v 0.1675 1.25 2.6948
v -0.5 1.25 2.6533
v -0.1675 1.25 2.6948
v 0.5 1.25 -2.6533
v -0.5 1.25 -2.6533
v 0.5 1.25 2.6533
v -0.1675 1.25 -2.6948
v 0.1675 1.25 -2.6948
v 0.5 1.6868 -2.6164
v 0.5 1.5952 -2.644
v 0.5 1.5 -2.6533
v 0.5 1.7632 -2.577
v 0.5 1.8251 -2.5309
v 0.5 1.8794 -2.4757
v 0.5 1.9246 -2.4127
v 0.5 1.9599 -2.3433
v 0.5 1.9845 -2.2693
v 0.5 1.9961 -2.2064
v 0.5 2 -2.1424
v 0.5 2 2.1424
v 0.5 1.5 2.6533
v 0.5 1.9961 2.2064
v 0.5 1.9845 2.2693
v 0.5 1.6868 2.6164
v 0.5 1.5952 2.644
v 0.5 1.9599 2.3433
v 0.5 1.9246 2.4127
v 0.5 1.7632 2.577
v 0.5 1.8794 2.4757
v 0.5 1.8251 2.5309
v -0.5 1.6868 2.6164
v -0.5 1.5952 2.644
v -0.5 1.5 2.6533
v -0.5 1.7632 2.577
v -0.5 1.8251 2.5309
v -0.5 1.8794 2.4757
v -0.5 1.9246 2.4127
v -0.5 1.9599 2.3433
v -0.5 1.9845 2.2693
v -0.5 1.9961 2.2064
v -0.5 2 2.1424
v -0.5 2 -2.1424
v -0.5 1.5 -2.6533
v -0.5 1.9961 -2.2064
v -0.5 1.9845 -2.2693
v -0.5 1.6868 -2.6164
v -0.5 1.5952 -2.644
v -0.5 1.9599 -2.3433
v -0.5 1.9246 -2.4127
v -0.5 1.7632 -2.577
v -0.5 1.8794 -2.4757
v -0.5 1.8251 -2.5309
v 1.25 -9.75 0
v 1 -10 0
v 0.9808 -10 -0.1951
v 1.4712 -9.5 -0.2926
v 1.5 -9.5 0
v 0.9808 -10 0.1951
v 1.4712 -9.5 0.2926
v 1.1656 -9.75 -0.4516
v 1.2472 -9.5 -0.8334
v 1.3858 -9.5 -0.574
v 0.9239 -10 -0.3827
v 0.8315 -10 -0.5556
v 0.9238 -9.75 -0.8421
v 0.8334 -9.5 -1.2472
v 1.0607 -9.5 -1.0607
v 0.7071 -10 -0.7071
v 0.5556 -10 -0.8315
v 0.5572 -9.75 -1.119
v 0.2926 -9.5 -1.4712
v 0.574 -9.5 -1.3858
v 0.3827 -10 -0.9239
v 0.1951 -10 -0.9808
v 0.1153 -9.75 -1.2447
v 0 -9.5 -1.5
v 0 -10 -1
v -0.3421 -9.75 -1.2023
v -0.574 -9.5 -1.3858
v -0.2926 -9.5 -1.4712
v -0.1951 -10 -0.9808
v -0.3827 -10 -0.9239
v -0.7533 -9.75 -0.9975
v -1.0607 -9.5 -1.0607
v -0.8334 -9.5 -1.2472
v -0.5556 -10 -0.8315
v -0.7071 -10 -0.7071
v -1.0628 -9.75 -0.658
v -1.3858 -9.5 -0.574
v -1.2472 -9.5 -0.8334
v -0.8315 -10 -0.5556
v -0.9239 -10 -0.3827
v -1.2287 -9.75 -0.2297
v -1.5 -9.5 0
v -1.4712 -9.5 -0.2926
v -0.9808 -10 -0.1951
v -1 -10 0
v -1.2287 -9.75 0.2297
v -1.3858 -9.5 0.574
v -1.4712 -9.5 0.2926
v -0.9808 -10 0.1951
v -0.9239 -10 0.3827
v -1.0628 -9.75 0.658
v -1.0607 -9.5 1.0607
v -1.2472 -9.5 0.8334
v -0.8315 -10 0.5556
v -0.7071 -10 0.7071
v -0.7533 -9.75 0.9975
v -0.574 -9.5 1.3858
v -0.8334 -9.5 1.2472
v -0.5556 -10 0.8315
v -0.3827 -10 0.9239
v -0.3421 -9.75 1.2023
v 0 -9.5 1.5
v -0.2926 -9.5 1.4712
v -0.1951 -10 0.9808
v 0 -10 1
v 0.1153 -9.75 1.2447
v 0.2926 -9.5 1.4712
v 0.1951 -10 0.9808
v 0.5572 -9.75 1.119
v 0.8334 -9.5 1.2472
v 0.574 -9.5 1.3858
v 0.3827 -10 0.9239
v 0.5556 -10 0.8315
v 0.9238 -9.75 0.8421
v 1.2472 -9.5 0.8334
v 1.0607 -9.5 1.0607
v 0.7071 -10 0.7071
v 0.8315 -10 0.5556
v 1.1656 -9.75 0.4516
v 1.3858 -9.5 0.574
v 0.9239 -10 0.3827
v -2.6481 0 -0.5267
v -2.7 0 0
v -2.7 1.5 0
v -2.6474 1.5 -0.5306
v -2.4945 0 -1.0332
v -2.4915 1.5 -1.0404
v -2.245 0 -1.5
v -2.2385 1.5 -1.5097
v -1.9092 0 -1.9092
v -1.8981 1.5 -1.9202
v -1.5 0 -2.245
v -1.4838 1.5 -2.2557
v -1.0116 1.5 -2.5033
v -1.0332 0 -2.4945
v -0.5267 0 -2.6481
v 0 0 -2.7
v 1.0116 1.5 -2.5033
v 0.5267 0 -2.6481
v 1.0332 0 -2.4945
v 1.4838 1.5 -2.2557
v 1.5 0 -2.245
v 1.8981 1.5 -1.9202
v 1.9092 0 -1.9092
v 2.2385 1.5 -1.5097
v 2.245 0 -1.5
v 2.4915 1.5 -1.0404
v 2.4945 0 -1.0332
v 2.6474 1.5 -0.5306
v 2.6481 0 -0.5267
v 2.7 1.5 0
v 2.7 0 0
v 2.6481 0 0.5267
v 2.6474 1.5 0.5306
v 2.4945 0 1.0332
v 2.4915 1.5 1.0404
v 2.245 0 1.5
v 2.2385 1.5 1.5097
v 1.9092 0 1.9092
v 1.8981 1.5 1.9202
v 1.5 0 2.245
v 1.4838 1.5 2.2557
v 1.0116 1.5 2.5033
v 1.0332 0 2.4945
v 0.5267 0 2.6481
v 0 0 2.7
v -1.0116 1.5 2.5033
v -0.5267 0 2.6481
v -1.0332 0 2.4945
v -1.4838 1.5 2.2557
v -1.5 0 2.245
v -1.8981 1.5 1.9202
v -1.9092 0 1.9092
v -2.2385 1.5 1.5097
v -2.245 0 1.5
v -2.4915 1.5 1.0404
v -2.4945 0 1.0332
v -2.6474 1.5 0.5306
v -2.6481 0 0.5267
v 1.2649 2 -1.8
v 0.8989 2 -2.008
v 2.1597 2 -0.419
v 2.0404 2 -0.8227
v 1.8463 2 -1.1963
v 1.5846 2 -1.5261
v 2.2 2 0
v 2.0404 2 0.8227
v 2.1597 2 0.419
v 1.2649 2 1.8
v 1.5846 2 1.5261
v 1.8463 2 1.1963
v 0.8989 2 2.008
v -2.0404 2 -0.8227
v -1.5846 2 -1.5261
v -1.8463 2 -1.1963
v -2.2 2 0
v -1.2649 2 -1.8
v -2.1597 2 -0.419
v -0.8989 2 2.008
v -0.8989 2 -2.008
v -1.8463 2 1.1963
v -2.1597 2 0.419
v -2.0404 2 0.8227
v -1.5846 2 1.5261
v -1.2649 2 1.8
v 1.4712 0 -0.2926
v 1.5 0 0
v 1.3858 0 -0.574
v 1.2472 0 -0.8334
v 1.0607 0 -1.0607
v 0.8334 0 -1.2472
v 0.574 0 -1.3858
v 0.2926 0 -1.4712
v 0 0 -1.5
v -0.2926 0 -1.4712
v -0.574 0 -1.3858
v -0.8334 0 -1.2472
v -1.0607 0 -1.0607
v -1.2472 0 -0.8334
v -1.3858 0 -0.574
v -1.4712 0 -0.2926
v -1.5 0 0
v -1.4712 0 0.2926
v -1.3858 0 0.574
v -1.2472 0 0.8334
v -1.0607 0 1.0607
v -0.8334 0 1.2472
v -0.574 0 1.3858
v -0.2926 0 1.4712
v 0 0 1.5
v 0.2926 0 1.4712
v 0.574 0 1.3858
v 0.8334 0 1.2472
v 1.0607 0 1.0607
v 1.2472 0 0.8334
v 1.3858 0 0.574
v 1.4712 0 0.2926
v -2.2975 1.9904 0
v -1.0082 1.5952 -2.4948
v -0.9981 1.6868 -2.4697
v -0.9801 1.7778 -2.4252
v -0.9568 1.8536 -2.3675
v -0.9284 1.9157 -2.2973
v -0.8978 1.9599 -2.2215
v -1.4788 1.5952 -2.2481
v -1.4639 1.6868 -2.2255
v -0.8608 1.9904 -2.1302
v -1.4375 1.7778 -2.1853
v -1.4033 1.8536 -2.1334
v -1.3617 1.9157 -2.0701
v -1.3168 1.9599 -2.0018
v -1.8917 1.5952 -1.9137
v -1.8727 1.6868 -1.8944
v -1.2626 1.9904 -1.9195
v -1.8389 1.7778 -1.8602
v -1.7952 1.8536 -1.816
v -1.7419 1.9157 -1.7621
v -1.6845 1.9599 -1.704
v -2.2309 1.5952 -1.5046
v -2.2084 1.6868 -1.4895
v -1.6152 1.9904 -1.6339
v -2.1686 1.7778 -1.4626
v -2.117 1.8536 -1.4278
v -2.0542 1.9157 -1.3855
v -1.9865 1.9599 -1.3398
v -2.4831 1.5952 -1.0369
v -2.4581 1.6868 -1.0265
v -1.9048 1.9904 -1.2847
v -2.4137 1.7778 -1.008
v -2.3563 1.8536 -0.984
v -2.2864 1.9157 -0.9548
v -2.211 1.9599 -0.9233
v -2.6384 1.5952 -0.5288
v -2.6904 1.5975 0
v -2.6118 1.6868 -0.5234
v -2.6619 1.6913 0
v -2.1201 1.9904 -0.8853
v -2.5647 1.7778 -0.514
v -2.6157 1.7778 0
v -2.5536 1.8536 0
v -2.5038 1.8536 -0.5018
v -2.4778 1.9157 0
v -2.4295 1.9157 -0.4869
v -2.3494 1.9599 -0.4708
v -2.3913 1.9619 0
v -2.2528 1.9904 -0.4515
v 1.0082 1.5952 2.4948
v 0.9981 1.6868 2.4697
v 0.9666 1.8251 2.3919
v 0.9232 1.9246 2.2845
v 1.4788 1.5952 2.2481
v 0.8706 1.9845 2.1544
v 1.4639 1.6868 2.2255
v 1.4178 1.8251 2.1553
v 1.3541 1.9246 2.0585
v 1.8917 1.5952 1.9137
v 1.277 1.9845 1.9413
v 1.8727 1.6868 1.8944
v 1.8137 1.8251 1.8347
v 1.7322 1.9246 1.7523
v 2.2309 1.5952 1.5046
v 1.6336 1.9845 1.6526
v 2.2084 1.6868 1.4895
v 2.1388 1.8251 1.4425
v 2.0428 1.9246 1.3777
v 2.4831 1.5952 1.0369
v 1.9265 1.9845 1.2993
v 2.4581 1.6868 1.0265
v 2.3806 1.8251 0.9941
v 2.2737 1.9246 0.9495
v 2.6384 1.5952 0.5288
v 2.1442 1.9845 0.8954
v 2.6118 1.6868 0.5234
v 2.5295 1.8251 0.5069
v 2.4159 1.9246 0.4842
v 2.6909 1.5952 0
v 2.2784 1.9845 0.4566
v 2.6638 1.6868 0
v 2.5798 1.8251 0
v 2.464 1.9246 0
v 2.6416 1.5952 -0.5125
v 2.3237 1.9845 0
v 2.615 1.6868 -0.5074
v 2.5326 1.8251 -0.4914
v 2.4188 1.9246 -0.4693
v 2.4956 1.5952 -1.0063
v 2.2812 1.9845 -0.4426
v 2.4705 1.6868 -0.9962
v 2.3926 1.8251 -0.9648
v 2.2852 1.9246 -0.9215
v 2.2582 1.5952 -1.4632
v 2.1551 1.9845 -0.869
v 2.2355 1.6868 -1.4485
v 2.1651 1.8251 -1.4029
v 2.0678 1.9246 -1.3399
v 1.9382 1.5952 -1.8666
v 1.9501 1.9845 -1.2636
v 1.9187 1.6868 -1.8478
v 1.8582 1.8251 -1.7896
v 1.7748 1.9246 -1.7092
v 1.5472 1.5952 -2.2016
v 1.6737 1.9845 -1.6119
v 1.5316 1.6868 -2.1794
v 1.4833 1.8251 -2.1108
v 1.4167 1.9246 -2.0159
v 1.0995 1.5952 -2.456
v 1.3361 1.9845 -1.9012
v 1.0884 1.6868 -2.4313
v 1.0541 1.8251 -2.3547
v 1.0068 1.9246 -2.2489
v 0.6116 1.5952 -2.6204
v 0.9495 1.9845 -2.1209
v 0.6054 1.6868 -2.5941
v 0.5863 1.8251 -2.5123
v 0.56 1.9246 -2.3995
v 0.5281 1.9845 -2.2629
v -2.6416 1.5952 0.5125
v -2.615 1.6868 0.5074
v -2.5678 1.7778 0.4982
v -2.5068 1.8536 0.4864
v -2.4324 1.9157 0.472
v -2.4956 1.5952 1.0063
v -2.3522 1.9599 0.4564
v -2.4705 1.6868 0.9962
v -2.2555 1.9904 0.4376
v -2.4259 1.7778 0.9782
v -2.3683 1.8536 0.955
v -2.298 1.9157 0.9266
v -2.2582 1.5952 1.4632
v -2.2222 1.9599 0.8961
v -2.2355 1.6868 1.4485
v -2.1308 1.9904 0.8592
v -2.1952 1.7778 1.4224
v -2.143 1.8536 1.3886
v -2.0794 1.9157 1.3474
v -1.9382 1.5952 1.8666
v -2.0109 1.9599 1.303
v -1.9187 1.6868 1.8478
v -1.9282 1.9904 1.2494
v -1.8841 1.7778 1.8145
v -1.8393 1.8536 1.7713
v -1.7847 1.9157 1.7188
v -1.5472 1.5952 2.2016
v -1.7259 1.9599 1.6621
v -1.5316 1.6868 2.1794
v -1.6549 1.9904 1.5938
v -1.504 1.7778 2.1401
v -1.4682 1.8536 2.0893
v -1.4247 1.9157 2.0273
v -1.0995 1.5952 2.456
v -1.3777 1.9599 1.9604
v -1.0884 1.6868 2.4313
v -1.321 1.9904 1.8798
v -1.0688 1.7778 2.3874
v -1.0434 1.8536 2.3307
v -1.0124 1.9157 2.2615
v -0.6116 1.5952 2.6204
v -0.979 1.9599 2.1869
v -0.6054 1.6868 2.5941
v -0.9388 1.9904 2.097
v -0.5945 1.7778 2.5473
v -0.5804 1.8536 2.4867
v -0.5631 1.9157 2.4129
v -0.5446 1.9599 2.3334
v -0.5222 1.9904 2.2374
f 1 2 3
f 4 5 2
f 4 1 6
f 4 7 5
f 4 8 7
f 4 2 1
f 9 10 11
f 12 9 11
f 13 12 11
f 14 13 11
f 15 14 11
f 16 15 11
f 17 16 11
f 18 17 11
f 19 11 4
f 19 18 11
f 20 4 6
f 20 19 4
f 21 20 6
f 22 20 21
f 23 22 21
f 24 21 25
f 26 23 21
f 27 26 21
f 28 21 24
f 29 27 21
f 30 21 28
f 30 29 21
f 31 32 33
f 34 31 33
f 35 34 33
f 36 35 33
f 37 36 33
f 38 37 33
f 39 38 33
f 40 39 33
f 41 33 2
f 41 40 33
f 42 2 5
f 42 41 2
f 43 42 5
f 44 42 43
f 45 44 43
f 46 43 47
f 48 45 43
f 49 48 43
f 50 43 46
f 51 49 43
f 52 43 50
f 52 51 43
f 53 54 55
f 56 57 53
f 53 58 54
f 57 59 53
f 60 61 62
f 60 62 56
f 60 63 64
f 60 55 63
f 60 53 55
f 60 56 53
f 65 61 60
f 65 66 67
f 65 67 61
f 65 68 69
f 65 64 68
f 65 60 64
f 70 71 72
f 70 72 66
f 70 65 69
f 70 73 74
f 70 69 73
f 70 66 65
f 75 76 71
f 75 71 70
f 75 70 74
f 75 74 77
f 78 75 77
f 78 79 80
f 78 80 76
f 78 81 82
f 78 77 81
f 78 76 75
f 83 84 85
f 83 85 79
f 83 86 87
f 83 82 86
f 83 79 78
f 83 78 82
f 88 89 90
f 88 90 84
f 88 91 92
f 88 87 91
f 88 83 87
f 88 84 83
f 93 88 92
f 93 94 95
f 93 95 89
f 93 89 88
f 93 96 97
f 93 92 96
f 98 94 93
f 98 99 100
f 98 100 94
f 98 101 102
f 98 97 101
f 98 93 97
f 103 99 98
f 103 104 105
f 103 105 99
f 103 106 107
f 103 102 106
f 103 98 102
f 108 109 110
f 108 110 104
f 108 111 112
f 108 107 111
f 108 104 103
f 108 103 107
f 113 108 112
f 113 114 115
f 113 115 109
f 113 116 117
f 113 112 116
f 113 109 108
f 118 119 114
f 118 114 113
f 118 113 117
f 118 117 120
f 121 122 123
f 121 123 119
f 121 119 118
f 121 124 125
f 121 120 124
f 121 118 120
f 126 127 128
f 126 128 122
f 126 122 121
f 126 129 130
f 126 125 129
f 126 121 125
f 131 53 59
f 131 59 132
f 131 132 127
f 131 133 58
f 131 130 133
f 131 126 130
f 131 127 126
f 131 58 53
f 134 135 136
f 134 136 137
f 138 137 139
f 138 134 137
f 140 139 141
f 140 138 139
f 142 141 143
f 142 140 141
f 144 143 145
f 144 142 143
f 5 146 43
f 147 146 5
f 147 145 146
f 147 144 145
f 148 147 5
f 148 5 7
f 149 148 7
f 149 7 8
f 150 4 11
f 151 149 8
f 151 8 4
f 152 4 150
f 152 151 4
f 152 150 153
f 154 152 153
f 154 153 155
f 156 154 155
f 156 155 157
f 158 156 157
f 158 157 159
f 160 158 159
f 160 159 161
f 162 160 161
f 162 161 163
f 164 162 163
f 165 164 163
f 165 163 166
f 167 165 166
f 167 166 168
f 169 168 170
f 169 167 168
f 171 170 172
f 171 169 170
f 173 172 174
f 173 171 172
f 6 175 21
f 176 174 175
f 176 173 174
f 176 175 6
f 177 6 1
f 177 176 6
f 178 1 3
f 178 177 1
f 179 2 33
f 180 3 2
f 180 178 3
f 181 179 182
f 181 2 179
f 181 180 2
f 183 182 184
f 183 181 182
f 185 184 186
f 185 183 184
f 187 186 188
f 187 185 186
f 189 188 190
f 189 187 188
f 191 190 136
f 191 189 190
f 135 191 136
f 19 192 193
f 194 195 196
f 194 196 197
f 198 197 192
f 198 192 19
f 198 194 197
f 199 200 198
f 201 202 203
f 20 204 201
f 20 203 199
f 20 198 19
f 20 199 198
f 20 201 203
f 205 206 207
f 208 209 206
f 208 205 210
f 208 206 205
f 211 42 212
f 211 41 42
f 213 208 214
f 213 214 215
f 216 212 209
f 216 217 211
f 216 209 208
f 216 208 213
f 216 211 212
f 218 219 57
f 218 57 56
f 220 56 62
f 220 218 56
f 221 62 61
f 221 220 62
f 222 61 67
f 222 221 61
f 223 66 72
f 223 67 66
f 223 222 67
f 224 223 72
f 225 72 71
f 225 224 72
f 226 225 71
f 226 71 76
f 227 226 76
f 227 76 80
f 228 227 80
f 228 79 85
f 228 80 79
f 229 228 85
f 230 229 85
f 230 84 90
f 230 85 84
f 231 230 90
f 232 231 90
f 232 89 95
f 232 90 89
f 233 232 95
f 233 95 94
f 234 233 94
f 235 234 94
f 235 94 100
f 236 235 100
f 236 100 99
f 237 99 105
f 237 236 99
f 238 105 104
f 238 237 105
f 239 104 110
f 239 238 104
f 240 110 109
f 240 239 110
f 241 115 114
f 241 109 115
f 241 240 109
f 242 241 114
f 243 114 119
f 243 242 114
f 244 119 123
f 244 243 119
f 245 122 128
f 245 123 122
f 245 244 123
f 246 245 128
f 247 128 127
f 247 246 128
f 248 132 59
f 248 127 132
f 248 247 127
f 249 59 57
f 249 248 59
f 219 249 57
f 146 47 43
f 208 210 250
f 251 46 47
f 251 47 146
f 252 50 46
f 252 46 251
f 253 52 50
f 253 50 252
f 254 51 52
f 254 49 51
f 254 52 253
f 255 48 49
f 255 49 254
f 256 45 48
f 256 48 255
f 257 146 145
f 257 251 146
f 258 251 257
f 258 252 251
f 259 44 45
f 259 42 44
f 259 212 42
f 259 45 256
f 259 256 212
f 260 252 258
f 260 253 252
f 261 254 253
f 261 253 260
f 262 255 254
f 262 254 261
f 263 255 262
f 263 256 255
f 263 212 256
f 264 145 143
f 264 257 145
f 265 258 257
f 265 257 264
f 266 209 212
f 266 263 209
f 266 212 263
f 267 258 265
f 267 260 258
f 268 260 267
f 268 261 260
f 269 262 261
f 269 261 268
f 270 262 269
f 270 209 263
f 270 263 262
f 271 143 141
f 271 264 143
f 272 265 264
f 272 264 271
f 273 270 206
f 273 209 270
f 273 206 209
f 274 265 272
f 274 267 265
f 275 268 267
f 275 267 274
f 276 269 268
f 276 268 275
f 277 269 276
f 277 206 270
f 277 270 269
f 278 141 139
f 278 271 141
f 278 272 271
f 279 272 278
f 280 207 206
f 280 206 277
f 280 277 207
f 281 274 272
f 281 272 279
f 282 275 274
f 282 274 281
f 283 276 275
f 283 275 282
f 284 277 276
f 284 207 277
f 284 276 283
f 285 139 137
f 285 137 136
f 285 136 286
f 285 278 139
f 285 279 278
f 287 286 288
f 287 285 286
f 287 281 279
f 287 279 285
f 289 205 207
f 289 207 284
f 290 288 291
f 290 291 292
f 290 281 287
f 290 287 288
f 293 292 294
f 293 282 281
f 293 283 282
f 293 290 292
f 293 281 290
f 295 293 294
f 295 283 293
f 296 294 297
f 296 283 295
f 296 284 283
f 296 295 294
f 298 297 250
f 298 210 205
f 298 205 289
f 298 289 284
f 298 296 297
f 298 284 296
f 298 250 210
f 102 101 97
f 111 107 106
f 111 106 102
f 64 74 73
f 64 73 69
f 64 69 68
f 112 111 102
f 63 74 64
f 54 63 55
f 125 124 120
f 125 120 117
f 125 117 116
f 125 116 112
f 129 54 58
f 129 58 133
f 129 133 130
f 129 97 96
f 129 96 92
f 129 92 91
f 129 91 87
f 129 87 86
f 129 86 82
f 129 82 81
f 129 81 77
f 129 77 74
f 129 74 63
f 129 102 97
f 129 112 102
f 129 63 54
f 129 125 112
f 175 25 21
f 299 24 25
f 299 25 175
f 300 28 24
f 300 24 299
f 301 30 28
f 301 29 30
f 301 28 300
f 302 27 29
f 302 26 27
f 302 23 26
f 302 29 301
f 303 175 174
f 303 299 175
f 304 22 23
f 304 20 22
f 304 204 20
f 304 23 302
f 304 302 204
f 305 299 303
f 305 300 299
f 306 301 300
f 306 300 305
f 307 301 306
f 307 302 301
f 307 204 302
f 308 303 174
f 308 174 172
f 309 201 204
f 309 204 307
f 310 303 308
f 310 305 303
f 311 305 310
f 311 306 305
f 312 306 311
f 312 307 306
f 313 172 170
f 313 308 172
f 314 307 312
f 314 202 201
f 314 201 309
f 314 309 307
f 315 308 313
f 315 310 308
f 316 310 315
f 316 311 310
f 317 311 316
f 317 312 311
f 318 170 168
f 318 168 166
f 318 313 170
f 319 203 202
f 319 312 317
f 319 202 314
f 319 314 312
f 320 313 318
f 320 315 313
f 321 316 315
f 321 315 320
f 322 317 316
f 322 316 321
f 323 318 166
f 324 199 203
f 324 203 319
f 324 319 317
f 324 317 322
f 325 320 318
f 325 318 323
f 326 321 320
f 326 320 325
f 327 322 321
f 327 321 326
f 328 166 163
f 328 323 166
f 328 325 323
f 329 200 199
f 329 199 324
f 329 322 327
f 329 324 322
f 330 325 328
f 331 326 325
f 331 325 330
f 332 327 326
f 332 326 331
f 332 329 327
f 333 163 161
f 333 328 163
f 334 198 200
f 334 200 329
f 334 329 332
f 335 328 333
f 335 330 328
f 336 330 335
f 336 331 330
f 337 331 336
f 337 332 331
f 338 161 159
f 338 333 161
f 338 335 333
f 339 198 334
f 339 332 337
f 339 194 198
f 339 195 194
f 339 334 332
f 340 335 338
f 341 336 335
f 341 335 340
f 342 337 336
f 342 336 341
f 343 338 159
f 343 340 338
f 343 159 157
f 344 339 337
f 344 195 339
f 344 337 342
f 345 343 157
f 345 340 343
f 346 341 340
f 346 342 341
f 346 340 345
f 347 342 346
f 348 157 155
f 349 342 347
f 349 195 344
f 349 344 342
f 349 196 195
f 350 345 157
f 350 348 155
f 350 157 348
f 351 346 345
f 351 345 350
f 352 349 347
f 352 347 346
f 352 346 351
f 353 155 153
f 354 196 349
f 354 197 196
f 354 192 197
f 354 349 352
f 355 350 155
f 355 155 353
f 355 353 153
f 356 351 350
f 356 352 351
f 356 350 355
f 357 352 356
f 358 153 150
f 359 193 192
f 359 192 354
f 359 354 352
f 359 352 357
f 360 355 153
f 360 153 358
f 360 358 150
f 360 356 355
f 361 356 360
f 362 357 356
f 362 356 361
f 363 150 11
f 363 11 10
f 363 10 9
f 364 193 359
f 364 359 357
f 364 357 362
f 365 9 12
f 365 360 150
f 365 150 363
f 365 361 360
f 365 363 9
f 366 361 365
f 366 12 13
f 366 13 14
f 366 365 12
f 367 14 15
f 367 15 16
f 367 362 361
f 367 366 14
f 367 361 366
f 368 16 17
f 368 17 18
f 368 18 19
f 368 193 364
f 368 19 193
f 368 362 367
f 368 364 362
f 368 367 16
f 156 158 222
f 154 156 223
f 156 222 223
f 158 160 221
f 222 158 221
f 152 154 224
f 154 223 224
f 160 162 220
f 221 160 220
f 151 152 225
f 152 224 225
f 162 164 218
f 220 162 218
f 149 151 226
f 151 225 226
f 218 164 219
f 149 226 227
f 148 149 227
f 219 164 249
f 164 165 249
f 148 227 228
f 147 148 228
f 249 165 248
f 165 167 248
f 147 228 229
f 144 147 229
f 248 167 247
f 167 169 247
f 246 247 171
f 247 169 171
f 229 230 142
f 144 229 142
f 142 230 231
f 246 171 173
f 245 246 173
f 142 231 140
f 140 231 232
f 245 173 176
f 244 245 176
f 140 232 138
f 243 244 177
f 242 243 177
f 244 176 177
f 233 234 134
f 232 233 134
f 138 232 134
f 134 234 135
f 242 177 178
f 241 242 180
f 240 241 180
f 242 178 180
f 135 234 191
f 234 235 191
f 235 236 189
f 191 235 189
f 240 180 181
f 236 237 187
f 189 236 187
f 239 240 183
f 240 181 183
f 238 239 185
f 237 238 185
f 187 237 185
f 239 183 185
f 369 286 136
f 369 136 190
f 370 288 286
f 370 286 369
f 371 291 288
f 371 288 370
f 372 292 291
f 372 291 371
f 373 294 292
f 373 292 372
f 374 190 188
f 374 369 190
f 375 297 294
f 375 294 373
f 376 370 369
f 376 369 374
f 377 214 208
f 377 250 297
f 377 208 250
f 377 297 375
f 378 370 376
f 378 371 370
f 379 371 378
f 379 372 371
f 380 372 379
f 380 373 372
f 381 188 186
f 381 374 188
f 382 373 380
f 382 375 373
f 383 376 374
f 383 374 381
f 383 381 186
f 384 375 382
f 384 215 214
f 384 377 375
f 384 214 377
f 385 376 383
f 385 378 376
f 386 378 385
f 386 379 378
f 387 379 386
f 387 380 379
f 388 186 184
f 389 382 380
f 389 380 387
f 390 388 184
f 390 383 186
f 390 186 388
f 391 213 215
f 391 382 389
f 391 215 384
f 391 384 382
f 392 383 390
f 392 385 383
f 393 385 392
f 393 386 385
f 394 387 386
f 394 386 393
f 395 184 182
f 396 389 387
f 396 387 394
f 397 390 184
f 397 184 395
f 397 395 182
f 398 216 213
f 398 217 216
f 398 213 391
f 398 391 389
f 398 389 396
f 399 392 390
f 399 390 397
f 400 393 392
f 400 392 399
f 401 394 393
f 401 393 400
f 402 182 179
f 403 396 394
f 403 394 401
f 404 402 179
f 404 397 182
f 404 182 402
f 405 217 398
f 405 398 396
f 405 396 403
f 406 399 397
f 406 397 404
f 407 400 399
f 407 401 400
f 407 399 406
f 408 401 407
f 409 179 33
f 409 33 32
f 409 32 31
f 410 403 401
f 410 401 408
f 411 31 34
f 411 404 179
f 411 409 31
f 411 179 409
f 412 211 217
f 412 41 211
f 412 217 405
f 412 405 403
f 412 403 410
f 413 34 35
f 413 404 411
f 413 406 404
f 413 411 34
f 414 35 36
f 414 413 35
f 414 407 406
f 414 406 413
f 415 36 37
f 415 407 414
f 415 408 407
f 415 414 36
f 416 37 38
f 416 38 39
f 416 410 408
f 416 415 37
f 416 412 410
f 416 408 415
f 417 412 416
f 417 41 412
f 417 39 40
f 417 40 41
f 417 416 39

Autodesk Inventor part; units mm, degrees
ref_plane "YZ Plane" through (0, 0, 0) normal (1, 0, 0) x (0, 1, 0)
ref_plane "XZ Plane" through (0, 0, 0) normal (0, 1, 0) x (-1, 0, 0)
ref_plane "XY Plane" through (0, 0, 0) normal (0, 0, 1) x (1, 0, 0)
sketch "Sketch1" plane through (0, 0, 0) normal (0, 1, 0) x (-1, 0, 0)
  circle A0 centre (0, 0) radius 2.7
  dimension "headDiameter" = 5.4
extrude "Extrusion1" add sketch "Sketch1" along normal blind 2
sketch "Sketch2" plane through (0, 2, 0) normal (0, 1, 0) x (1, 0, 0)
  line L0 (0.5, -2.7) -> (-0.5, -2.7)
  line L1 (-0.5, -2.7) -> (-0.5, 2.7)
  line L2 (-0.5, 2.7) -> (0.5, 2.7)
  line L3 (0.5, 2.7) -> (0.5, -2.7)
  line L4 (0.5, -2.7) -> (-0.5, 2.7) construction
  line L5 (-0.5, -2.7) -> (0.5, 2.7) construction
  point P0 (0, 0)
  dimension "d3" = 1
  dimension "d4" = 5.4
extrude "Extrusion2" cut sketch "Sketch2" against normal blind 0.75
sketch "Sketch3" plane through (0, 0, 0) normal (0, -1, 0) x (1, 0, 0)
  circle A0 centre (0, 0) radius 1.5
  dimension "d7" = 3
extrude "Extrusion3" add sketch "Sketch3" along normal blind 10
chamfer "Chamfer1" distance 0.5 angle 45 1 edges at (-1.5, -10, 0)
fillet "Fillet1" radius 0.5 3 edges at (-2.0785, 2, 1.7234) (-2.0785, 2, -1.7234) (2.7, 2, 0)
equation "\"d4\" = headDiameter"
properties part number "machineScrew3x10" material "Stainless Steel"
